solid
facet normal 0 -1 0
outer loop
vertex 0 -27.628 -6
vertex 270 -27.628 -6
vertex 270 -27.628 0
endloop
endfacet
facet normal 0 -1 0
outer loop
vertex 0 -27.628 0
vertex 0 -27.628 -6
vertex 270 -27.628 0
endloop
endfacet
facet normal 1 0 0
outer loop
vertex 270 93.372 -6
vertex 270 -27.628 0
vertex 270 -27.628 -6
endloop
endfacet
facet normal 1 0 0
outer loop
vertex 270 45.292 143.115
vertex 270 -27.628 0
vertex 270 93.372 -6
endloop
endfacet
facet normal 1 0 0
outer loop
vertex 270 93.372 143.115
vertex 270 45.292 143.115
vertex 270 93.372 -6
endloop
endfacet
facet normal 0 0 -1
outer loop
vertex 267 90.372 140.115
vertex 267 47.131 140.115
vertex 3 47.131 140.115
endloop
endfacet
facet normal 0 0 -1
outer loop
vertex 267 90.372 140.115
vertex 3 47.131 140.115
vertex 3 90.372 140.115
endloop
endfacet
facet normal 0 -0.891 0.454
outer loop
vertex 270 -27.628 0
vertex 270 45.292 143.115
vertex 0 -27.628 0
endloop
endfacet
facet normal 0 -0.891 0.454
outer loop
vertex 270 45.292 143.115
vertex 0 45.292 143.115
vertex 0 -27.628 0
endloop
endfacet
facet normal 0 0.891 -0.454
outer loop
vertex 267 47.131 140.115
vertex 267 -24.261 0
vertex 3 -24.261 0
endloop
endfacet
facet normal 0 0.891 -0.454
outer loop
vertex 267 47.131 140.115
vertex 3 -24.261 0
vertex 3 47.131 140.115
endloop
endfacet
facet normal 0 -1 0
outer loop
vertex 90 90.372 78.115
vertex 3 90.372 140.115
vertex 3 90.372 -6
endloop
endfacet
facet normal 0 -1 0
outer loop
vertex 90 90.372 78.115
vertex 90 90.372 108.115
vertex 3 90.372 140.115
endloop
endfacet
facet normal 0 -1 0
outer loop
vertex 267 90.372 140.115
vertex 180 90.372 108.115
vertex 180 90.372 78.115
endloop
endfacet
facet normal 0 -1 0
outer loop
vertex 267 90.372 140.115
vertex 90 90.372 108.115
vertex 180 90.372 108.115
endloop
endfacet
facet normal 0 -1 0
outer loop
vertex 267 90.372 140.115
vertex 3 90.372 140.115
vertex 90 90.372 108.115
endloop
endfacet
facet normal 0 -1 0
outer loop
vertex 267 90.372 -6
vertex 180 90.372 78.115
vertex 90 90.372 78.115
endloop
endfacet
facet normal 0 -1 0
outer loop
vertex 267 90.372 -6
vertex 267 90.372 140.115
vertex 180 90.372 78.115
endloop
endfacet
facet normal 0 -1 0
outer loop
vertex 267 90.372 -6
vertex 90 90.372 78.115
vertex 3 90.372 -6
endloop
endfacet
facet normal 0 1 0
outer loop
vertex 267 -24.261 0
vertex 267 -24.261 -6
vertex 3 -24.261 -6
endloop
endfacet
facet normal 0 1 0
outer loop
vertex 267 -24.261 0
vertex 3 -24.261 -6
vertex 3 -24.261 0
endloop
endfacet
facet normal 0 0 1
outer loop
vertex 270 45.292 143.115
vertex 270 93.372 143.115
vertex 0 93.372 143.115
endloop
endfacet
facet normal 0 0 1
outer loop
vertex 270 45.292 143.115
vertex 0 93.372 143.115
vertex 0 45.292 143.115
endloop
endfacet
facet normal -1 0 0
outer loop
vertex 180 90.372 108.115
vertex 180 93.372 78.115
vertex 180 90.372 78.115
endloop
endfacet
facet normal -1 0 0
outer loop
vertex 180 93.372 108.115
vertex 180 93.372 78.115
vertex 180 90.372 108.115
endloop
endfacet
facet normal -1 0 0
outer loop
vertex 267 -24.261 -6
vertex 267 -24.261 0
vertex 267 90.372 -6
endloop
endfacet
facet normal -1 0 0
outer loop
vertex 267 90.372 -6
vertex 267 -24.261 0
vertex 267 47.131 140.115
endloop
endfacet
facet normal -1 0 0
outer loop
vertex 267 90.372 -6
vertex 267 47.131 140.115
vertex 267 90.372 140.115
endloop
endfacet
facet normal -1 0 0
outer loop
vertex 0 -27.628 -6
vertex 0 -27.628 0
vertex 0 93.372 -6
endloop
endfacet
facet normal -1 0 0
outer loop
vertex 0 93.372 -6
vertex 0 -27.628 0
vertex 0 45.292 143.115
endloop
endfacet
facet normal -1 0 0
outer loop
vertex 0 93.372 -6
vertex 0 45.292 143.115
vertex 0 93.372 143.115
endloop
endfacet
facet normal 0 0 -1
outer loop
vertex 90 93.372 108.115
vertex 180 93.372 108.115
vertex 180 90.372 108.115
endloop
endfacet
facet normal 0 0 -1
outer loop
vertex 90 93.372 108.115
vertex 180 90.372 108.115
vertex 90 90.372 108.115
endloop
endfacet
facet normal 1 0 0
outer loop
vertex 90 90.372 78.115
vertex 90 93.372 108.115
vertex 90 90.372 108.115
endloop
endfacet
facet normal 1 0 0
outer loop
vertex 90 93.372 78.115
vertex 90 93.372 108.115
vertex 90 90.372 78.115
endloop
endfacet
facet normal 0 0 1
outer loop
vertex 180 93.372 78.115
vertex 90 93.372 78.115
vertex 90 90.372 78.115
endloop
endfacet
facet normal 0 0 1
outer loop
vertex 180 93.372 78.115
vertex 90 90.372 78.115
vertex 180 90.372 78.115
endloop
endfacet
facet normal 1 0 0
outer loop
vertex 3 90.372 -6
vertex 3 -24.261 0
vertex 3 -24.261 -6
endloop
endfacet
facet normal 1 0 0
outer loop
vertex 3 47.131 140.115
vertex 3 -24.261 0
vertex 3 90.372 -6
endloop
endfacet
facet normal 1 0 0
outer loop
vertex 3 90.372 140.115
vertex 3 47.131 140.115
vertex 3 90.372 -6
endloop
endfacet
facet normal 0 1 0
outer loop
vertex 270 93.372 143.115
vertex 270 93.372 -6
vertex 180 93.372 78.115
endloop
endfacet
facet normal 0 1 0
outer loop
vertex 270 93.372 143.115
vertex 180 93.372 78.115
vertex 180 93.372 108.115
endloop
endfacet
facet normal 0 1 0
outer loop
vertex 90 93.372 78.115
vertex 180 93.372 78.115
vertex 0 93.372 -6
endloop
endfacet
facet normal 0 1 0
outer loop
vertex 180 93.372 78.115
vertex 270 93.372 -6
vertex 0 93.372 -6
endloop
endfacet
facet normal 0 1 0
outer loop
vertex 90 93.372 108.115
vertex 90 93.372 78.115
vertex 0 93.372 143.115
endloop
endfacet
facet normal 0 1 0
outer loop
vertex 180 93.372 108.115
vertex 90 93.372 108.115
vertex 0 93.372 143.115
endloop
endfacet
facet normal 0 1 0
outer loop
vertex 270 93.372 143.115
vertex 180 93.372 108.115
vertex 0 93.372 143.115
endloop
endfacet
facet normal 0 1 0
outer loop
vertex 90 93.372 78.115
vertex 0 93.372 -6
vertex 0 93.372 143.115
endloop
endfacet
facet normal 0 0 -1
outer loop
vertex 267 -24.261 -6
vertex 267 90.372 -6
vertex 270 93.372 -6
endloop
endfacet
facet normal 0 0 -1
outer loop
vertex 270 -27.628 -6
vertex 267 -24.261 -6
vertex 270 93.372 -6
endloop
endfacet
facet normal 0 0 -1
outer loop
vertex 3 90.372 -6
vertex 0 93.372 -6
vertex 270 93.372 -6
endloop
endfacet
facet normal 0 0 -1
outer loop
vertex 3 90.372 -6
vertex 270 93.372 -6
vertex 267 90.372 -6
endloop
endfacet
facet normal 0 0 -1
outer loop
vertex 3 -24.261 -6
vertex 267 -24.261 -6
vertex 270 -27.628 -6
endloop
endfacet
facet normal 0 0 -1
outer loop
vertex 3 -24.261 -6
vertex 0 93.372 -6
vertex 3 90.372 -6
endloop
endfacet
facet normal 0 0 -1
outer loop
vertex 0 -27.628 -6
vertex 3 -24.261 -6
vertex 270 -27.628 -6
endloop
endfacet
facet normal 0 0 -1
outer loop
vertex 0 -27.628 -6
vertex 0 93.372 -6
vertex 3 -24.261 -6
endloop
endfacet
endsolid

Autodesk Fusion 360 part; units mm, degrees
sketch "Unsorted Smarties Holder" plane through (0, 0, 0) normal (1, 0, 0) x (0, 1, 0)
  line L0 (0, 0) -> (93.3717, 0)
  line L1 (93.3717, 0) -> (93.3717, 143.115)
  line L2 (93.3717, 143.115) -> (45.2924, 143.115)
  line L3 (45.2924, 143.115) -> (-27.6283, 0)
  line L4 (-27.6283, 0) -> (0, 0)
  line L5 (-27.6283, 0) -> (93.3717, 0)
  line L6 (93.3717, 0) -> (93.3717, -6)
  line L7 (93.3717, -6) -> (-27.6283, -6)
  line L8 (-27.6283, -6) -> (-27.6283, 0)
  dimension "d5" = 143.115
  dimension "d14" = 63
  dimension "d23" = 121
  dimension "d31" = 6
extrude "Extrude1" add sketch "Unsorted Smarties Holder" along normal blind 270
sketch "Sketch3" plane through (270, 0, 0) normal (1, 0, 0) x (0, 1, 0)
  line L0 (93.3717, -6) -> (93.3717, 143.115)
  line L1 (93.3717, 143.115) -> (45.2924, 143.115)
  line L2 (45.2924, 143.115) -> (-27.6283, 0)
  line L3 (90.3717, 140.115) -> (90.3717, 0)
  line L4 (90.3717, 0) -> (-24.2614, 0)
  line L5 (-24.2614, 0) -> (47.1308, 140.115)
  line L6 (47.1308, 140.115) -> (90.3717, 140.115)
  line L7 (-27.6283, 0) -> (-27.6283, -6)
  line L8 (-27.6283, -6) -> (93.3717, -6)
  line L9 (-24.2614, 0) -> (90.3717, 0)
  line L10 (90.3717, 0) -> (90.3717, -6)
  line L11 (90.3717, -6) -> (-24.2614, -6)
  line L12 (-24.2614, -6) -> (-24.2614, 0)
  dimension "d15" = 3
  dimension "d16" = 3
  dimension "d17" = 3
  dimension "d18" = 3
  dimension "d32" = 6
  dimension "d33" = 6
extrude "Extrude3" cut sketch "Sketch3" against normal blind 264 from surface at -3 contours L4 L8 L9 L10 L11 L12 | L3 L4 L5 L6 L9
sketch "Smarties Feed" plane through (0, 93.3717, 0) normal (0, 1, 0) x (-1, 0, 0)
  line L0 (0, -6) -> (0, 143.115)
  line L1 (0, 143.115) -> (-270, 143.115)
  line L2 (-270, 143.115) -> (-270, -6)
  line L3 (-180, 108.115) -> (-90, 108.115)
  line L4 (-90, 108.115) -> (-90, 78.115)
  line L5 (-90, 78.115) -> (-180, 78.115)
  line L6 (-180, 78.115) -> (-180, 108.115)
  line L7 (-270, -6) -> (0, -6)
  dimension "d24" = 30
  dimension "d25" = 90
  dimension "d26" = 90
  dimension "d27" = 90
  dimension "d28" = 35
extrude "Extrude4" cut sketch "Smarties Feed" against normal blind 3 contours L3 L4 L5 L6
equation "polycarbonateThickness = 3 mm" comment "Thickness of the polycarbonate panels"
equation "d14 = 180 deg - 117 deg"
equation "d15 = polycarbonateThickness"
equation "d16 = polycarbonateThickness"
equation "d17 = polycarbonateThickness"
equation "d18 = polycarbonateThickness"
equation "d20 = -polycarbonateThickness"
equation "d21 = -( 270 mm - 2 * polycarbonateThickness )"
equation "d28 = 41 mm - 6 mm"
equation "d29 = -polycarbonateThickness"
